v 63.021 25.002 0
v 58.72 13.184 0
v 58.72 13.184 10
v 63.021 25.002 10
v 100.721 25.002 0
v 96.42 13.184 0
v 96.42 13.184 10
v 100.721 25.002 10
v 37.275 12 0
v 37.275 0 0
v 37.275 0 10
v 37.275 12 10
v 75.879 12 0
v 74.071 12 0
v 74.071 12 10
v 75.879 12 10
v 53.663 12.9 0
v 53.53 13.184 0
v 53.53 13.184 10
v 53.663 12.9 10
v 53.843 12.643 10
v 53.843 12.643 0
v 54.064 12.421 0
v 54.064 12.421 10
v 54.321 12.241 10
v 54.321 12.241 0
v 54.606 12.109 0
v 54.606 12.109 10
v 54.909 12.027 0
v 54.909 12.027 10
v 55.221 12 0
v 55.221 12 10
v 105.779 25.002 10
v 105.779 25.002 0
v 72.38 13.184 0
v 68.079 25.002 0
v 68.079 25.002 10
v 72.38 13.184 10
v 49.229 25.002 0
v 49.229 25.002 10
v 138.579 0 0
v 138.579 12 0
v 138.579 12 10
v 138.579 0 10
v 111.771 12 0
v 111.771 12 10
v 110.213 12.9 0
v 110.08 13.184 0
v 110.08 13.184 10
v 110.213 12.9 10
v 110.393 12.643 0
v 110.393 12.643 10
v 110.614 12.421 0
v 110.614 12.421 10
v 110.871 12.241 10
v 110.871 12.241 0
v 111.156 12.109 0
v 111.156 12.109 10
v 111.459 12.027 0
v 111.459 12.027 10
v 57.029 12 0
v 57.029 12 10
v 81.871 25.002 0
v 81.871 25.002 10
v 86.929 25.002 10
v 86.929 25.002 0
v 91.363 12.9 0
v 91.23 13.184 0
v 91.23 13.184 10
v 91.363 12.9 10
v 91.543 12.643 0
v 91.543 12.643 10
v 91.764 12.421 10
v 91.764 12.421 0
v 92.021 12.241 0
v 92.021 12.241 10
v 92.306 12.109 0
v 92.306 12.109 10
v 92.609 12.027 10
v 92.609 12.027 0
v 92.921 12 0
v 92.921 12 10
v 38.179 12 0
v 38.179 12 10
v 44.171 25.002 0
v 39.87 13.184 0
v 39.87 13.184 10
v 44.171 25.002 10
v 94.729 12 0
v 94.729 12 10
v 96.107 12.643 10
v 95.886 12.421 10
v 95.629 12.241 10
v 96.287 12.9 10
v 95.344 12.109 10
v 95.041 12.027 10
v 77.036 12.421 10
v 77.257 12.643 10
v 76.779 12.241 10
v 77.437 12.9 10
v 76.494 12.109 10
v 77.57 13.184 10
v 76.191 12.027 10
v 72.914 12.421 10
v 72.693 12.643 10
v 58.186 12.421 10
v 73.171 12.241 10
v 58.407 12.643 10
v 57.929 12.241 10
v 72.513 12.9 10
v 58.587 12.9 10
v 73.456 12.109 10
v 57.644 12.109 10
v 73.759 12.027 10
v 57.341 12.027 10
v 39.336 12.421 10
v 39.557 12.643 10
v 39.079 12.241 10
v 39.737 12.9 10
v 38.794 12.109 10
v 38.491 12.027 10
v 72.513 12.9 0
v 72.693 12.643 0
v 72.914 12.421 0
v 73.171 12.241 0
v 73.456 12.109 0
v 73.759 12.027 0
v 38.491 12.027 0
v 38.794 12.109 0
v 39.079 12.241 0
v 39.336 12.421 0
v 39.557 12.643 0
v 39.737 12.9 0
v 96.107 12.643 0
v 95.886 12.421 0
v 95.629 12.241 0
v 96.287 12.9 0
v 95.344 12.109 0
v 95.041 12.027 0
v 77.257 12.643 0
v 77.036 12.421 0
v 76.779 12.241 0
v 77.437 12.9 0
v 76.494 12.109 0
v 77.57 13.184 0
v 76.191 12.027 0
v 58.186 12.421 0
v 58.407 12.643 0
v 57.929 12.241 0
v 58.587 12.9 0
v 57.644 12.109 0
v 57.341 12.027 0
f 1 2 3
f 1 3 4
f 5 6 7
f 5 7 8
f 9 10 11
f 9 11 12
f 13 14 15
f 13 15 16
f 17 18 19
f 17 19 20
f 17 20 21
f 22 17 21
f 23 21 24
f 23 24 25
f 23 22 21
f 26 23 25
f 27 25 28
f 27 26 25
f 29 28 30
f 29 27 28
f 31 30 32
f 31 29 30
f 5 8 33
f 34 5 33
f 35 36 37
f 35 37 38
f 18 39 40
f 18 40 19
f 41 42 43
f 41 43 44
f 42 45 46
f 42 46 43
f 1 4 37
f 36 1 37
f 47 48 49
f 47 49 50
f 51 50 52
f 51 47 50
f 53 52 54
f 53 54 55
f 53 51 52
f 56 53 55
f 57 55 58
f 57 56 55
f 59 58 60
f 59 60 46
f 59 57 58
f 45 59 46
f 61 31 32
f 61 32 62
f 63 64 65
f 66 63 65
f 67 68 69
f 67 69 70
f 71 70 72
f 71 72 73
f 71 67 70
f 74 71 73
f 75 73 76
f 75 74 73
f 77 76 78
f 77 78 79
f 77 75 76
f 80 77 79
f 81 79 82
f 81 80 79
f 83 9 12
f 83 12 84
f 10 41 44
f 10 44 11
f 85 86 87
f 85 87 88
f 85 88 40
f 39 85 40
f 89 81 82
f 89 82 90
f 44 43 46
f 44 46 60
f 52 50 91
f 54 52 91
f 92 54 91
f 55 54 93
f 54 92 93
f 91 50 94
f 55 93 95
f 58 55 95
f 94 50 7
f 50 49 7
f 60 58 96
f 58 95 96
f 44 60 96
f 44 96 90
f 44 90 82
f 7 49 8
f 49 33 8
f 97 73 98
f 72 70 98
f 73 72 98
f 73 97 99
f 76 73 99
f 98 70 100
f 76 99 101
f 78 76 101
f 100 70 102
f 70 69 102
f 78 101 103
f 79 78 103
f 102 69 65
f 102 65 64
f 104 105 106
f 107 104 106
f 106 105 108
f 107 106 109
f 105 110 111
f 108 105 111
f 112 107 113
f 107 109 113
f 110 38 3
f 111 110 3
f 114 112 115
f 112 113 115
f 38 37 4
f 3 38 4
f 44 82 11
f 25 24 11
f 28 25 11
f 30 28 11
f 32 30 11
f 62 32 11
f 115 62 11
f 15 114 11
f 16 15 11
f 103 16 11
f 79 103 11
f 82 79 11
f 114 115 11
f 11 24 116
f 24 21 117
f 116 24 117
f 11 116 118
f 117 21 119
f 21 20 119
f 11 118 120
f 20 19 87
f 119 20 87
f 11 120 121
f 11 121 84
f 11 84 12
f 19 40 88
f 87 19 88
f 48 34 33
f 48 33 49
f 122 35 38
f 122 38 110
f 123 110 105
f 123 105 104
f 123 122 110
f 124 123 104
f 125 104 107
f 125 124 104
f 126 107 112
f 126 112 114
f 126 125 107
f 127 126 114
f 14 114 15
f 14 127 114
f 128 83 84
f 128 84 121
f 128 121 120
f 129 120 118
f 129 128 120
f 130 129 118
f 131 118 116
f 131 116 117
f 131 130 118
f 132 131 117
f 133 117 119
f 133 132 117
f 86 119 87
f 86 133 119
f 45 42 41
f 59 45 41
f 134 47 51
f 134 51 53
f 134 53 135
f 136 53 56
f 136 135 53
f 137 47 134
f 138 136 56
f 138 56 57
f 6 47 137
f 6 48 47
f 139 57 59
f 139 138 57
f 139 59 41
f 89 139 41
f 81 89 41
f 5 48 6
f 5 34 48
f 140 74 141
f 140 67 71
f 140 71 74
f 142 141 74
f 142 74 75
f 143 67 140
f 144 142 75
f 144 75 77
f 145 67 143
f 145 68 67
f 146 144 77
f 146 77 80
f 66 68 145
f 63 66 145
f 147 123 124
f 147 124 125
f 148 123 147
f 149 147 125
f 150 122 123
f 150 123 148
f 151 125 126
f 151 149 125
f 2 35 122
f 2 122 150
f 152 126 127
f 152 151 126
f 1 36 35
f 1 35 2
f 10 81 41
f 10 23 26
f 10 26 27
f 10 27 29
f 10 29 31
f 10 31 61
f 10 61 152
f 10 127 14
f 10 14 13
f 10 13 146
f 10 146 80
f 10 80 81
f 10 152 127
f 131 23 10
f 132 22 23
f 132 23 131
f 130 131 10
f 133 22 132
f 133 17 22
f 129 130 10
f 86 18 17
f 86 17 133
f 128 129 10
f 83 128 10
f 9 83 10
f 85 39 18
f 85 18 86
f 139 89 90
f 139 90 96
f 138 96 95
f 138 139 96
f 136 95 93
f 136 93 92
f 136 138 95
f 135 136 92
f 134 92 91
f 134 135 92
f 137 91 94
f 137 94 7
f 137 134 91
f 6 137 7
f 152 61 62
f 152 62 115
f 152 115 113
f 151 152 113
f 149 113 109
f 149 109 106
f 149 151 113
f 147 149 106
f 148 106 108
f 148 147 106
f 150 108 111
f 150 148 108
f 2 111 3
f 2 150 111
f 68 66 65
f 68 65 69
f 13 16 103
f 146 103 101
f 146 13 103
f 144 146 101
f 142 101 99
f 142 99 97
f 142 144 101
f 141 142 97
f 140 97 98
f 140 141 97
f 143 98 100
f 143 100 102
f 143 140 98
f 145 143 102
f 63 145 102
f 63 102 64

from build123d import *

# Parameters (mm, degrees)
BOSS_EXTRUDE1_DEPTH = 10


with BuildPart() as part:
    # Sketch1 → Boss-Extrude1 (new body)
    with BuildSketch(Plane.XY):
        with BuildLine():
            Line((138.578606851, 12), (138.578606851, 0))
            Line((138.578606851, 0), (37.275, 0))
            Line((37.275, 0), (37.275, 12))
            Line((37.275, 12), (38.178606851, 12))
            ThreePointArc((38.178606851, 12), (39.211044436, 12.32552632), (39.870053568, 13.184363742))
            Line((39.870053568, 13.184363742), (44.171321406, 25.002))
            Line((44.171321406, 25.002), (49.228678594, 25.002))
            Line((49.228678594, 25.002), (53.529946432, 13.184363742))
            ThreePointArc((53.529946432, 13.184363742), (54.188955564, 12.32552632), (55.221393149, 12))
            Line((55.221393149, 12), (57.028606851, 12))
            ThreePointArc((57.028606851, 12), (58.061044436, 12.32552632), (58.720053568, 13.184363742))
            Line((58.720053568, 13.184363742), (63.021321406, 25.002))
            Line((63.021321406, 25.002), (68.078678594, 25.002))
            Line((68.078678594, 25.002), (72.379946432, 13.184363742))
            ThreePointArc((72.379946432, 13.184363742), (73.038955564, 12.32552632), (74.071393149, 12))
            Line((74.071393149, 12), (75.878606851, 12))
            ThreePointArc((75.878606851, 12), (76.911044436, 12.32552632), (77.570053568, 13.184363742))
            Line((77.570053568, 13.184363742), (81.871321406, 25.002))
            Line((81.871321406, 25.002), (86.928678594, 25.002))
            Line((86.928678594, 25.002), (91.229946432, 13.184363742))
            ThreePointArc((91.229946432, 13.184363742), (91.888955564, 12.32552632), (92.921393149, 12))
            Line((92.921393149, 12), (94.728606851, 12))
            ThreePointArc((94.728606851, 12), (95.761044436, 12.32552632), (96.420053568, 13.184363742))
            Line((96.420053568, 13.184363742), (100.721321406, 25.002))
            Line((100.721321406, 25.002), (105.778678594, 25.002))
            Line((105.778678594, 25.002), (110.079946432, 13.184363742))
            ThreePointArc((110.079946432, 13.184363742), (110.738955564, 12.32552632), (111.771393149, 12))
            Line((111.771393149, 12), (113.578606851, 12))
            Line((113.578606851, 12), (138.578606851, 12))
        make_face()
    extrude(amount=BOSS_EXTRUDE1_DEPTH)


solid = part.part
